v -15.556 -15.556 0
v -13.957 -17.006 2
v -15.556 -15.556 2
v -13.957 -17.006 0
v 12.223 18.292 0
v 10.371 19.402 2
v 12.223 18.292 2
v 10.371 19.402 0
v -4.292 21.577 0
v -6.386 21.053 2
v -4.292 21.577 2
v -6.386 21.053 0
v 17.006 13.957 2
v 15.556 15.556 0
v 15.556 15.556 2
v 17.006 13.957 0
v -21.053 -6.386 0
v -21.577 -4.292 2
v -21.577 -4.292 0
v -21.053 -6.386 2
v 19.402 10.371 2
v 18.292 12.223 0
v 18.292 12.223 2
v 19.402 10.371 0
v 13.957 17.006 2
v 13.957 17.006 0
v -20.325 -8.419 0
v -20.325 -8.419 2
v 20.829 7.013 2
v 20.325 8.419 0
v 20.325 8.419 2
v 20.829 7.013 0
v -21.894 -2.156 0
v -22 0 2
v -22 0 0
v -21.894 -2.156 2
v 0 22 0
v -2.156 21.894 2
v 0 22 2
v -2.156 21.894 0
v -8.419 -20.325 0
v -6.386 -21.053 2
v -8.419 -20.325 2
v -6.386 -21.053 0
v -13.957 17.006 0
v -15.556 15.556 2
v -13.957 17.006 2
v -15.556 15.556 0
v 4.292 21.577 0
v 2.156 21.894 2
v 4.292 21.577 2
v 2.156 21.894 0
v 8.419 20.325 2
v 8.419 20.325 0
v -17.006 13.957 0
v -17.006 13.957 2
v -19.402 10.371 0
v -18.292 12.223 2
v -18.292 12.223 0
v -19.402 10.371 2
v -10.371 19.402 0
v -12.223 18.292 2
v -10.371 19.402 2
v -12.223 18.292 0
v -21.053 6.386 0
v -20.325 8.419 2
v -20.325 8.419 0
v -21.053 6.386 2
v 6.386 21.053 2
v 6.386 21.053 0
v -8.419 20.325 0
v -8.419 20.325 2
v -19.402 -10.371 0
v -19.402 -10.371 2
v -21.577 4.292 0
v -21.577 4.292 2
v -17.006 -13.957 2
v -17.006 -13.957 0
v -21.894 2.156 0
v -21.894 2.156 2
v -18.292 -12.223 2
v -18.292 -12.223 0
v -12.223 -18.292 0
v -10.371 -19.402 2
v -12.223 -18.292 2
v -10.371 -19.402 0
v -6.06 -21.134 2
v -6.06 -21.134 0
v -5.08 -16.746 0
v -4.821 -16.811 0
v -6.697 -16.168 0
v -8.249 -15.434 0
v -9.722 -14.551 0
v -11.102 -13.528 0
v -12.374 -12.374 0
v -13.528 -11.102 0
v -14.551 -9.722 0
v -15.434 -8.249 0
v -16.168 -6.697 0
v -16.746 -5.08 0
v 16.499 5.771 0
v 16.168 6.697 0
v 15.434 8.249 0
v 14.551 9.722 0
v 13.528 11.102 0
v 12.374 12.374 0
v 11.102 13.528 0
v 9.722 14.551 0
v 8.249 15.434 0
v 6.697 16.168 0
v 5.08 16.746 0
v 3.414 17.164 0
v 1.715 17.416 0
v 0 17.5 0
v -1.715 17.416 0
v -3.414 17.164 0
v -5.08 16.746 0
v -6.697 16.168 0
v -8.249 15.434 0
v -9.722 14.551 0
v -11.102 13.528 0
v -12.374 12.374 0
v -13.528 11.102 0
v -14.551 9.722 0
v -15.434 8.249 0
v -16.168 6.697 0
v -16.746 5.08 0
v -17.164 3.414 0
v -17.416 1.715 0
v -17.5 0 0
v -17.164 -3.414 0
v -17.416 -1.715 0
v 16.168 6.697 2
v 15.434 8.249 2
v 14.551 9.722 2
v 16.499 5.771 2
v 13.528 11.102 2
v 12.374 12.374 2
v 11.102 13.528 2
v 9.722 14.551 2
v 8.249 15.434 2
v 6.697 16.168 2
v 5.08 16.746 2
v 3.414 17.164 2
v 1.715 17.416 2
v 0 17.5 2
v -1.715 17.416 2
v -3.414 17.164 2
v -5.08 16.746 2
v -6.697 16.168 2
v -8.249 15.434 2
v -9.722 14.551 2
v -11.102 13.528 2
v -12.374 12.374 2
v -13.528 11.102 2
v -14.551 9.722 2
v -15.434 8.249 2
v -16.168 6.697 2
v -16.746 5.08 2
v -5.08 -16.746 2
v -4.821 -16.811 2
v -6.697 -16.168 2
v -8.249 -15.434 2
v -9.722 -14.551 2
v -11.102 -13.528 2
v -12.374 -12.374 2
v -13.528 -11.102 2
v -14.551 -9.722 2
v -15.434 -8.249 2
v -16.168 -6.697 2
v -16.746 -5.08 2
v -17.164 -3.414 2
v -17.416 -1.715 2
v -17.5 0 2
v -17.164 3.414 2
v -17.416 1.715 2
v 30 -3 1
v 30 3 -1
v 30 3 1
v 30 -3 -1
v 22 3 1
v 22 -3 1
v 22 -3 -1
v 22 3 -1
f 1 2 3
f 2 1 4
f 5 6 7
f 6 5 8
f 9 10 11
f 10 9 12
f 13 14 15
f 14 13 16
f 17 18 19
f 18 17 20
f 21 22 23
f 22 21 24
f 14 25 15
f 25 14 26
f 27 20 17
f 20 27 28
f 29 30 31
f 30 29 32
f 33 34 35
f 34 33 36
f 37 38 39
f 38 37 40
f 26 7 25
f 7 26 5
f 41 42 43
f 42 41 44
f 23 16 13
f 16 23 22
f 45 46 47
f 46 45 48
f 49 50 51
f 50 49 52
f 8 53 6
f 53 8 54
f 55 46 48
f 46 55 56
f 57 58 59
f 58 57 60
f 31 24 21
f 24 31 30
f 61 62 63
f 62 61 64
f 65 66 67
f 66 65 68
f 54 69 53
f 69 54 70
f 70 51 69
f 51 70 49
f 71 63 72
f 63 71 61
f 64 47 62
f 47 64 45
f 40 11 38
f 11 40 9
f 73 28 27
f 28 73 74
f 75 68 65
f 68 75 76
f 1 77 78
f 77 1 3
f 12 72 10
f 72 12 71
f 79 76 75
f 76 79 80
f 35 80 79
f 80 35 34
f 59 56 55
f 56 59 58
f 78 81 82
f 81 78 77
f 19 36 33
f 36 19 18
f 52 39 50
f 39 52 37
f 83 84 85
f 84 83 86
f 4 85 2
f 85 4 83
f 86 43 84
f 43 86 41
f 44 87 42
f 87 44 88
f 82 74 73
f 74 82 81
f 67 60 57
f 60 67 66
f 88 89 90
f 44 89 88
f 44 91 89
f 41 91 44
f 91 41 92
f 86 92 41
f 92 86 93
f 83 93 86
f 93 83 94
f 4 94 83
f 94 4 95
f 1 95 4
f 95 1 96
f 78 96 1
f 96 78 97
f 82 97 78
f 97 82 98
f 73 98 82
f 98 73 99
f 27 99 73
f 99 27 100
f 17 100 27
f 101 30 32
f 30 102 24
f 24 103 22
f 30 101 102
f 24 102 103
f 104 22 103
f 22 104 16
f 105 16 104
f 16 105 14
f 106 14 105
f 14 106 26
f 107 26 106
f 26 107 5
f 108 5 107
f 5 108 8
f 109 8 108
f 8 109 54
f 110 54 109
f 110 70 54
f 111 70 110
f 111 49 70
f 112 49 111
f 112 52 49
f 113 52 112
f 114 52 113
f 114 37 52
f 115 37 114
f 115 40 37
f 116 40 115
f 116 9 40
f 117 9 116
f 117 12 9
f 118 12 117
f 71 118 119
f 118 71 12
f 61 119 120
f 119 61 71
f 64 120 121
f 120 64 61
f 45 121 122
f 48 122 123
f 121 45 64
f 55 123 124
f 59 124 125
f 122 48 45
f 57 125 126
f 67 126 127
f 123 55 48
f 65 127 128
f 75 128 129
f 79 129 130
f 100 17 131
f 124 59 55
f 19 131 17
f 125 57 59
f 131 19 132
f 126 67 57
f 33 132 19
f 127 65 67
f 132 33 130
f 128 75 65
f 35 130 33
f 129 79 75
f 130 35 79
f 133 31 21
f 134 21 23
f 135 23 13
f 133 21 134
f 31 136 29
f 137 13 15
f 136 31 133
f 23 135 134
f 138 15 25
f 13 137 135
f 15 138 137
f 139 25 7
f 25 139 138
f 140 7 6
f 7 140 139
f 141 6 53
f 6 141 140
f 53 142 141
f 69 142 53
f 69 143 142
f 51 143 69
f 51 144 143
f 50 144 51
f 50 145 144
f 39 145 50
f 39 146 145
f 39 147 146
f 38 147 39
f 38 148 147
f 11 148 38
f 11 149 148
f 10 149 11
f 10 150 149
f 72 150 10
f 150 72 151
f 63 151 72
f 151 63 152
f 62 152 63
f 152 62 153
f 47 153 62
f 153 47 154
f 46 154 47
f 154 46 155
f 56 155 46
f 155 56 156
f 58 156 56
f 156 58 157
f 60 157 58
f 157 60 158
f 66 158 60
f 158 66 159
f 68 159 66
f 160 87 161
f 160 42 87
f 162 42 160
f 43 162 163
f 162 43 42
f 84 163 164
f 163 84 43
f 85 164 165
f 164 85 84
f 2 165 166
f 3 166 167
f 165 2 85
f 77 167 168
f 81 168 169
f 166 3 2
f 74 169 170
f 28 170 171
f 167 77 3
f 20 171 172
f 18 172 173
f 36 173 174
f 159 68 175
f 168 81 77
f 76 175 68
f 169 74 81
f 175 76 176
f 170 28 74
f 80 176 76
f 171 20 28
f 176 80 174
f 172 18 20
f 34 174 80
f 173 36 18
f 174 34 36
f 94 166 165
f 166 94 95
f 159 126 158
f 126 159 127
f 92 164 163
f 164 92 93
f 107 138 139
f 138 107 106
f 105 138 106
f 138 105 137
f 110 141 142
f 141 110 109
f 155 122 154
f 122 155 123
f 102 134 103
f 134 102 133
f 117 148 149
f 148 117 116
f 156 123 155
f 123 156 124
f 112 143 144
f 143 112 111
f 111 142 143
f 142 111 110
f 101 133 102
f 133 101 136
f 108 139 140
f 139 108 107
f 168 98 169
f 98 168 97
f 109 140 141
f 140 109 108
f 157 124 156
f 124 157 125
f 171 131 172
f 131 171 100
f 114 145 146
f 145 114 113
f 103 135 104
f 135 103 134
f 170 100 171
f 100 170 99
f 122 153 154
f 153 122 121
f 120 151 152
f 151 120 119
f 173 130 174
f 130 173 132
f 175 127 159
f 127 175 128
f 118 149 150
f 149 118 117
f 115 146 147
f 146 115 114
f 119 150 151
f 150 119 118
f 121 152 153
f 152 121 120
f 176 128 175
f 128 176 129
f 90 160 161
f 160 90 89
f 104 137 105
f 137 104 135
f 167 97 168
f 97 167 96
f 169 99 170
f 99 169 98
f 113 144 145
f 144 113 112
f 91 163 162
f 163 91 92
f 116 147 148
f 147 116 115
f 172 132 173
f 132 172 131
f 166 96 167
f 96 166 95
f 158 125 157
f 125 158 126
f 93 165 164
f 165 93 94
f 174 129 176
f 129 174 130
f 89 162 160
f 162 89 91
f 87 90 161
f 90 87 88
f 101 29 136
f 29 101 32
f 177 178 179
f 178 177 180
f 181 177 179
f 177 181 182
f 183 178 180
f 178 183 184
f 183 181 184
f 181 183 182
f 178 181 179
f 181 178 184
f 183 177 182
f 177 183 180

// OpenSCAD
// Active-cow indicator — C-ring with arrow tab. Print cyan/teal (#00ACC1).
// openscad -o active_cow_marker.stl active_cow_marker.scad

$fn = 64;

outer_r = 22;
inner_r = 17.5;
h = 2.0;
gap_deg = 32;
tab_len = 8;
tab_w = 6;

module ring_sector(a0, a1) {
    difference() {
        cylinder(h = h, r = outer_r, center = false);
        translate([0, 0, -0.1])
            cylinder(h = h + 0.2, r = inner_r, center = false);
        // Gap opening toward +X
        rotate([0, 0, -gap_deg / 2])
            translate([0, -outer_r - 1, -0.1])
                cube([outer_r + tab_len + 2, outer_r + 2, h + 0.2]);
        rotate([0, 0, gap_deg / 2])
            translate([0, -outer_r - 1, -0.1])
                cube([outer_r + tab_len + 2, outer_r + 2, h + 0.2]);
    }
}

union() {
    ring_sector(0, 360);
    translate([outer_r + tab_len / 2, 0, 0])
        cube([tab_len, tab_w, h], center = true);
}
